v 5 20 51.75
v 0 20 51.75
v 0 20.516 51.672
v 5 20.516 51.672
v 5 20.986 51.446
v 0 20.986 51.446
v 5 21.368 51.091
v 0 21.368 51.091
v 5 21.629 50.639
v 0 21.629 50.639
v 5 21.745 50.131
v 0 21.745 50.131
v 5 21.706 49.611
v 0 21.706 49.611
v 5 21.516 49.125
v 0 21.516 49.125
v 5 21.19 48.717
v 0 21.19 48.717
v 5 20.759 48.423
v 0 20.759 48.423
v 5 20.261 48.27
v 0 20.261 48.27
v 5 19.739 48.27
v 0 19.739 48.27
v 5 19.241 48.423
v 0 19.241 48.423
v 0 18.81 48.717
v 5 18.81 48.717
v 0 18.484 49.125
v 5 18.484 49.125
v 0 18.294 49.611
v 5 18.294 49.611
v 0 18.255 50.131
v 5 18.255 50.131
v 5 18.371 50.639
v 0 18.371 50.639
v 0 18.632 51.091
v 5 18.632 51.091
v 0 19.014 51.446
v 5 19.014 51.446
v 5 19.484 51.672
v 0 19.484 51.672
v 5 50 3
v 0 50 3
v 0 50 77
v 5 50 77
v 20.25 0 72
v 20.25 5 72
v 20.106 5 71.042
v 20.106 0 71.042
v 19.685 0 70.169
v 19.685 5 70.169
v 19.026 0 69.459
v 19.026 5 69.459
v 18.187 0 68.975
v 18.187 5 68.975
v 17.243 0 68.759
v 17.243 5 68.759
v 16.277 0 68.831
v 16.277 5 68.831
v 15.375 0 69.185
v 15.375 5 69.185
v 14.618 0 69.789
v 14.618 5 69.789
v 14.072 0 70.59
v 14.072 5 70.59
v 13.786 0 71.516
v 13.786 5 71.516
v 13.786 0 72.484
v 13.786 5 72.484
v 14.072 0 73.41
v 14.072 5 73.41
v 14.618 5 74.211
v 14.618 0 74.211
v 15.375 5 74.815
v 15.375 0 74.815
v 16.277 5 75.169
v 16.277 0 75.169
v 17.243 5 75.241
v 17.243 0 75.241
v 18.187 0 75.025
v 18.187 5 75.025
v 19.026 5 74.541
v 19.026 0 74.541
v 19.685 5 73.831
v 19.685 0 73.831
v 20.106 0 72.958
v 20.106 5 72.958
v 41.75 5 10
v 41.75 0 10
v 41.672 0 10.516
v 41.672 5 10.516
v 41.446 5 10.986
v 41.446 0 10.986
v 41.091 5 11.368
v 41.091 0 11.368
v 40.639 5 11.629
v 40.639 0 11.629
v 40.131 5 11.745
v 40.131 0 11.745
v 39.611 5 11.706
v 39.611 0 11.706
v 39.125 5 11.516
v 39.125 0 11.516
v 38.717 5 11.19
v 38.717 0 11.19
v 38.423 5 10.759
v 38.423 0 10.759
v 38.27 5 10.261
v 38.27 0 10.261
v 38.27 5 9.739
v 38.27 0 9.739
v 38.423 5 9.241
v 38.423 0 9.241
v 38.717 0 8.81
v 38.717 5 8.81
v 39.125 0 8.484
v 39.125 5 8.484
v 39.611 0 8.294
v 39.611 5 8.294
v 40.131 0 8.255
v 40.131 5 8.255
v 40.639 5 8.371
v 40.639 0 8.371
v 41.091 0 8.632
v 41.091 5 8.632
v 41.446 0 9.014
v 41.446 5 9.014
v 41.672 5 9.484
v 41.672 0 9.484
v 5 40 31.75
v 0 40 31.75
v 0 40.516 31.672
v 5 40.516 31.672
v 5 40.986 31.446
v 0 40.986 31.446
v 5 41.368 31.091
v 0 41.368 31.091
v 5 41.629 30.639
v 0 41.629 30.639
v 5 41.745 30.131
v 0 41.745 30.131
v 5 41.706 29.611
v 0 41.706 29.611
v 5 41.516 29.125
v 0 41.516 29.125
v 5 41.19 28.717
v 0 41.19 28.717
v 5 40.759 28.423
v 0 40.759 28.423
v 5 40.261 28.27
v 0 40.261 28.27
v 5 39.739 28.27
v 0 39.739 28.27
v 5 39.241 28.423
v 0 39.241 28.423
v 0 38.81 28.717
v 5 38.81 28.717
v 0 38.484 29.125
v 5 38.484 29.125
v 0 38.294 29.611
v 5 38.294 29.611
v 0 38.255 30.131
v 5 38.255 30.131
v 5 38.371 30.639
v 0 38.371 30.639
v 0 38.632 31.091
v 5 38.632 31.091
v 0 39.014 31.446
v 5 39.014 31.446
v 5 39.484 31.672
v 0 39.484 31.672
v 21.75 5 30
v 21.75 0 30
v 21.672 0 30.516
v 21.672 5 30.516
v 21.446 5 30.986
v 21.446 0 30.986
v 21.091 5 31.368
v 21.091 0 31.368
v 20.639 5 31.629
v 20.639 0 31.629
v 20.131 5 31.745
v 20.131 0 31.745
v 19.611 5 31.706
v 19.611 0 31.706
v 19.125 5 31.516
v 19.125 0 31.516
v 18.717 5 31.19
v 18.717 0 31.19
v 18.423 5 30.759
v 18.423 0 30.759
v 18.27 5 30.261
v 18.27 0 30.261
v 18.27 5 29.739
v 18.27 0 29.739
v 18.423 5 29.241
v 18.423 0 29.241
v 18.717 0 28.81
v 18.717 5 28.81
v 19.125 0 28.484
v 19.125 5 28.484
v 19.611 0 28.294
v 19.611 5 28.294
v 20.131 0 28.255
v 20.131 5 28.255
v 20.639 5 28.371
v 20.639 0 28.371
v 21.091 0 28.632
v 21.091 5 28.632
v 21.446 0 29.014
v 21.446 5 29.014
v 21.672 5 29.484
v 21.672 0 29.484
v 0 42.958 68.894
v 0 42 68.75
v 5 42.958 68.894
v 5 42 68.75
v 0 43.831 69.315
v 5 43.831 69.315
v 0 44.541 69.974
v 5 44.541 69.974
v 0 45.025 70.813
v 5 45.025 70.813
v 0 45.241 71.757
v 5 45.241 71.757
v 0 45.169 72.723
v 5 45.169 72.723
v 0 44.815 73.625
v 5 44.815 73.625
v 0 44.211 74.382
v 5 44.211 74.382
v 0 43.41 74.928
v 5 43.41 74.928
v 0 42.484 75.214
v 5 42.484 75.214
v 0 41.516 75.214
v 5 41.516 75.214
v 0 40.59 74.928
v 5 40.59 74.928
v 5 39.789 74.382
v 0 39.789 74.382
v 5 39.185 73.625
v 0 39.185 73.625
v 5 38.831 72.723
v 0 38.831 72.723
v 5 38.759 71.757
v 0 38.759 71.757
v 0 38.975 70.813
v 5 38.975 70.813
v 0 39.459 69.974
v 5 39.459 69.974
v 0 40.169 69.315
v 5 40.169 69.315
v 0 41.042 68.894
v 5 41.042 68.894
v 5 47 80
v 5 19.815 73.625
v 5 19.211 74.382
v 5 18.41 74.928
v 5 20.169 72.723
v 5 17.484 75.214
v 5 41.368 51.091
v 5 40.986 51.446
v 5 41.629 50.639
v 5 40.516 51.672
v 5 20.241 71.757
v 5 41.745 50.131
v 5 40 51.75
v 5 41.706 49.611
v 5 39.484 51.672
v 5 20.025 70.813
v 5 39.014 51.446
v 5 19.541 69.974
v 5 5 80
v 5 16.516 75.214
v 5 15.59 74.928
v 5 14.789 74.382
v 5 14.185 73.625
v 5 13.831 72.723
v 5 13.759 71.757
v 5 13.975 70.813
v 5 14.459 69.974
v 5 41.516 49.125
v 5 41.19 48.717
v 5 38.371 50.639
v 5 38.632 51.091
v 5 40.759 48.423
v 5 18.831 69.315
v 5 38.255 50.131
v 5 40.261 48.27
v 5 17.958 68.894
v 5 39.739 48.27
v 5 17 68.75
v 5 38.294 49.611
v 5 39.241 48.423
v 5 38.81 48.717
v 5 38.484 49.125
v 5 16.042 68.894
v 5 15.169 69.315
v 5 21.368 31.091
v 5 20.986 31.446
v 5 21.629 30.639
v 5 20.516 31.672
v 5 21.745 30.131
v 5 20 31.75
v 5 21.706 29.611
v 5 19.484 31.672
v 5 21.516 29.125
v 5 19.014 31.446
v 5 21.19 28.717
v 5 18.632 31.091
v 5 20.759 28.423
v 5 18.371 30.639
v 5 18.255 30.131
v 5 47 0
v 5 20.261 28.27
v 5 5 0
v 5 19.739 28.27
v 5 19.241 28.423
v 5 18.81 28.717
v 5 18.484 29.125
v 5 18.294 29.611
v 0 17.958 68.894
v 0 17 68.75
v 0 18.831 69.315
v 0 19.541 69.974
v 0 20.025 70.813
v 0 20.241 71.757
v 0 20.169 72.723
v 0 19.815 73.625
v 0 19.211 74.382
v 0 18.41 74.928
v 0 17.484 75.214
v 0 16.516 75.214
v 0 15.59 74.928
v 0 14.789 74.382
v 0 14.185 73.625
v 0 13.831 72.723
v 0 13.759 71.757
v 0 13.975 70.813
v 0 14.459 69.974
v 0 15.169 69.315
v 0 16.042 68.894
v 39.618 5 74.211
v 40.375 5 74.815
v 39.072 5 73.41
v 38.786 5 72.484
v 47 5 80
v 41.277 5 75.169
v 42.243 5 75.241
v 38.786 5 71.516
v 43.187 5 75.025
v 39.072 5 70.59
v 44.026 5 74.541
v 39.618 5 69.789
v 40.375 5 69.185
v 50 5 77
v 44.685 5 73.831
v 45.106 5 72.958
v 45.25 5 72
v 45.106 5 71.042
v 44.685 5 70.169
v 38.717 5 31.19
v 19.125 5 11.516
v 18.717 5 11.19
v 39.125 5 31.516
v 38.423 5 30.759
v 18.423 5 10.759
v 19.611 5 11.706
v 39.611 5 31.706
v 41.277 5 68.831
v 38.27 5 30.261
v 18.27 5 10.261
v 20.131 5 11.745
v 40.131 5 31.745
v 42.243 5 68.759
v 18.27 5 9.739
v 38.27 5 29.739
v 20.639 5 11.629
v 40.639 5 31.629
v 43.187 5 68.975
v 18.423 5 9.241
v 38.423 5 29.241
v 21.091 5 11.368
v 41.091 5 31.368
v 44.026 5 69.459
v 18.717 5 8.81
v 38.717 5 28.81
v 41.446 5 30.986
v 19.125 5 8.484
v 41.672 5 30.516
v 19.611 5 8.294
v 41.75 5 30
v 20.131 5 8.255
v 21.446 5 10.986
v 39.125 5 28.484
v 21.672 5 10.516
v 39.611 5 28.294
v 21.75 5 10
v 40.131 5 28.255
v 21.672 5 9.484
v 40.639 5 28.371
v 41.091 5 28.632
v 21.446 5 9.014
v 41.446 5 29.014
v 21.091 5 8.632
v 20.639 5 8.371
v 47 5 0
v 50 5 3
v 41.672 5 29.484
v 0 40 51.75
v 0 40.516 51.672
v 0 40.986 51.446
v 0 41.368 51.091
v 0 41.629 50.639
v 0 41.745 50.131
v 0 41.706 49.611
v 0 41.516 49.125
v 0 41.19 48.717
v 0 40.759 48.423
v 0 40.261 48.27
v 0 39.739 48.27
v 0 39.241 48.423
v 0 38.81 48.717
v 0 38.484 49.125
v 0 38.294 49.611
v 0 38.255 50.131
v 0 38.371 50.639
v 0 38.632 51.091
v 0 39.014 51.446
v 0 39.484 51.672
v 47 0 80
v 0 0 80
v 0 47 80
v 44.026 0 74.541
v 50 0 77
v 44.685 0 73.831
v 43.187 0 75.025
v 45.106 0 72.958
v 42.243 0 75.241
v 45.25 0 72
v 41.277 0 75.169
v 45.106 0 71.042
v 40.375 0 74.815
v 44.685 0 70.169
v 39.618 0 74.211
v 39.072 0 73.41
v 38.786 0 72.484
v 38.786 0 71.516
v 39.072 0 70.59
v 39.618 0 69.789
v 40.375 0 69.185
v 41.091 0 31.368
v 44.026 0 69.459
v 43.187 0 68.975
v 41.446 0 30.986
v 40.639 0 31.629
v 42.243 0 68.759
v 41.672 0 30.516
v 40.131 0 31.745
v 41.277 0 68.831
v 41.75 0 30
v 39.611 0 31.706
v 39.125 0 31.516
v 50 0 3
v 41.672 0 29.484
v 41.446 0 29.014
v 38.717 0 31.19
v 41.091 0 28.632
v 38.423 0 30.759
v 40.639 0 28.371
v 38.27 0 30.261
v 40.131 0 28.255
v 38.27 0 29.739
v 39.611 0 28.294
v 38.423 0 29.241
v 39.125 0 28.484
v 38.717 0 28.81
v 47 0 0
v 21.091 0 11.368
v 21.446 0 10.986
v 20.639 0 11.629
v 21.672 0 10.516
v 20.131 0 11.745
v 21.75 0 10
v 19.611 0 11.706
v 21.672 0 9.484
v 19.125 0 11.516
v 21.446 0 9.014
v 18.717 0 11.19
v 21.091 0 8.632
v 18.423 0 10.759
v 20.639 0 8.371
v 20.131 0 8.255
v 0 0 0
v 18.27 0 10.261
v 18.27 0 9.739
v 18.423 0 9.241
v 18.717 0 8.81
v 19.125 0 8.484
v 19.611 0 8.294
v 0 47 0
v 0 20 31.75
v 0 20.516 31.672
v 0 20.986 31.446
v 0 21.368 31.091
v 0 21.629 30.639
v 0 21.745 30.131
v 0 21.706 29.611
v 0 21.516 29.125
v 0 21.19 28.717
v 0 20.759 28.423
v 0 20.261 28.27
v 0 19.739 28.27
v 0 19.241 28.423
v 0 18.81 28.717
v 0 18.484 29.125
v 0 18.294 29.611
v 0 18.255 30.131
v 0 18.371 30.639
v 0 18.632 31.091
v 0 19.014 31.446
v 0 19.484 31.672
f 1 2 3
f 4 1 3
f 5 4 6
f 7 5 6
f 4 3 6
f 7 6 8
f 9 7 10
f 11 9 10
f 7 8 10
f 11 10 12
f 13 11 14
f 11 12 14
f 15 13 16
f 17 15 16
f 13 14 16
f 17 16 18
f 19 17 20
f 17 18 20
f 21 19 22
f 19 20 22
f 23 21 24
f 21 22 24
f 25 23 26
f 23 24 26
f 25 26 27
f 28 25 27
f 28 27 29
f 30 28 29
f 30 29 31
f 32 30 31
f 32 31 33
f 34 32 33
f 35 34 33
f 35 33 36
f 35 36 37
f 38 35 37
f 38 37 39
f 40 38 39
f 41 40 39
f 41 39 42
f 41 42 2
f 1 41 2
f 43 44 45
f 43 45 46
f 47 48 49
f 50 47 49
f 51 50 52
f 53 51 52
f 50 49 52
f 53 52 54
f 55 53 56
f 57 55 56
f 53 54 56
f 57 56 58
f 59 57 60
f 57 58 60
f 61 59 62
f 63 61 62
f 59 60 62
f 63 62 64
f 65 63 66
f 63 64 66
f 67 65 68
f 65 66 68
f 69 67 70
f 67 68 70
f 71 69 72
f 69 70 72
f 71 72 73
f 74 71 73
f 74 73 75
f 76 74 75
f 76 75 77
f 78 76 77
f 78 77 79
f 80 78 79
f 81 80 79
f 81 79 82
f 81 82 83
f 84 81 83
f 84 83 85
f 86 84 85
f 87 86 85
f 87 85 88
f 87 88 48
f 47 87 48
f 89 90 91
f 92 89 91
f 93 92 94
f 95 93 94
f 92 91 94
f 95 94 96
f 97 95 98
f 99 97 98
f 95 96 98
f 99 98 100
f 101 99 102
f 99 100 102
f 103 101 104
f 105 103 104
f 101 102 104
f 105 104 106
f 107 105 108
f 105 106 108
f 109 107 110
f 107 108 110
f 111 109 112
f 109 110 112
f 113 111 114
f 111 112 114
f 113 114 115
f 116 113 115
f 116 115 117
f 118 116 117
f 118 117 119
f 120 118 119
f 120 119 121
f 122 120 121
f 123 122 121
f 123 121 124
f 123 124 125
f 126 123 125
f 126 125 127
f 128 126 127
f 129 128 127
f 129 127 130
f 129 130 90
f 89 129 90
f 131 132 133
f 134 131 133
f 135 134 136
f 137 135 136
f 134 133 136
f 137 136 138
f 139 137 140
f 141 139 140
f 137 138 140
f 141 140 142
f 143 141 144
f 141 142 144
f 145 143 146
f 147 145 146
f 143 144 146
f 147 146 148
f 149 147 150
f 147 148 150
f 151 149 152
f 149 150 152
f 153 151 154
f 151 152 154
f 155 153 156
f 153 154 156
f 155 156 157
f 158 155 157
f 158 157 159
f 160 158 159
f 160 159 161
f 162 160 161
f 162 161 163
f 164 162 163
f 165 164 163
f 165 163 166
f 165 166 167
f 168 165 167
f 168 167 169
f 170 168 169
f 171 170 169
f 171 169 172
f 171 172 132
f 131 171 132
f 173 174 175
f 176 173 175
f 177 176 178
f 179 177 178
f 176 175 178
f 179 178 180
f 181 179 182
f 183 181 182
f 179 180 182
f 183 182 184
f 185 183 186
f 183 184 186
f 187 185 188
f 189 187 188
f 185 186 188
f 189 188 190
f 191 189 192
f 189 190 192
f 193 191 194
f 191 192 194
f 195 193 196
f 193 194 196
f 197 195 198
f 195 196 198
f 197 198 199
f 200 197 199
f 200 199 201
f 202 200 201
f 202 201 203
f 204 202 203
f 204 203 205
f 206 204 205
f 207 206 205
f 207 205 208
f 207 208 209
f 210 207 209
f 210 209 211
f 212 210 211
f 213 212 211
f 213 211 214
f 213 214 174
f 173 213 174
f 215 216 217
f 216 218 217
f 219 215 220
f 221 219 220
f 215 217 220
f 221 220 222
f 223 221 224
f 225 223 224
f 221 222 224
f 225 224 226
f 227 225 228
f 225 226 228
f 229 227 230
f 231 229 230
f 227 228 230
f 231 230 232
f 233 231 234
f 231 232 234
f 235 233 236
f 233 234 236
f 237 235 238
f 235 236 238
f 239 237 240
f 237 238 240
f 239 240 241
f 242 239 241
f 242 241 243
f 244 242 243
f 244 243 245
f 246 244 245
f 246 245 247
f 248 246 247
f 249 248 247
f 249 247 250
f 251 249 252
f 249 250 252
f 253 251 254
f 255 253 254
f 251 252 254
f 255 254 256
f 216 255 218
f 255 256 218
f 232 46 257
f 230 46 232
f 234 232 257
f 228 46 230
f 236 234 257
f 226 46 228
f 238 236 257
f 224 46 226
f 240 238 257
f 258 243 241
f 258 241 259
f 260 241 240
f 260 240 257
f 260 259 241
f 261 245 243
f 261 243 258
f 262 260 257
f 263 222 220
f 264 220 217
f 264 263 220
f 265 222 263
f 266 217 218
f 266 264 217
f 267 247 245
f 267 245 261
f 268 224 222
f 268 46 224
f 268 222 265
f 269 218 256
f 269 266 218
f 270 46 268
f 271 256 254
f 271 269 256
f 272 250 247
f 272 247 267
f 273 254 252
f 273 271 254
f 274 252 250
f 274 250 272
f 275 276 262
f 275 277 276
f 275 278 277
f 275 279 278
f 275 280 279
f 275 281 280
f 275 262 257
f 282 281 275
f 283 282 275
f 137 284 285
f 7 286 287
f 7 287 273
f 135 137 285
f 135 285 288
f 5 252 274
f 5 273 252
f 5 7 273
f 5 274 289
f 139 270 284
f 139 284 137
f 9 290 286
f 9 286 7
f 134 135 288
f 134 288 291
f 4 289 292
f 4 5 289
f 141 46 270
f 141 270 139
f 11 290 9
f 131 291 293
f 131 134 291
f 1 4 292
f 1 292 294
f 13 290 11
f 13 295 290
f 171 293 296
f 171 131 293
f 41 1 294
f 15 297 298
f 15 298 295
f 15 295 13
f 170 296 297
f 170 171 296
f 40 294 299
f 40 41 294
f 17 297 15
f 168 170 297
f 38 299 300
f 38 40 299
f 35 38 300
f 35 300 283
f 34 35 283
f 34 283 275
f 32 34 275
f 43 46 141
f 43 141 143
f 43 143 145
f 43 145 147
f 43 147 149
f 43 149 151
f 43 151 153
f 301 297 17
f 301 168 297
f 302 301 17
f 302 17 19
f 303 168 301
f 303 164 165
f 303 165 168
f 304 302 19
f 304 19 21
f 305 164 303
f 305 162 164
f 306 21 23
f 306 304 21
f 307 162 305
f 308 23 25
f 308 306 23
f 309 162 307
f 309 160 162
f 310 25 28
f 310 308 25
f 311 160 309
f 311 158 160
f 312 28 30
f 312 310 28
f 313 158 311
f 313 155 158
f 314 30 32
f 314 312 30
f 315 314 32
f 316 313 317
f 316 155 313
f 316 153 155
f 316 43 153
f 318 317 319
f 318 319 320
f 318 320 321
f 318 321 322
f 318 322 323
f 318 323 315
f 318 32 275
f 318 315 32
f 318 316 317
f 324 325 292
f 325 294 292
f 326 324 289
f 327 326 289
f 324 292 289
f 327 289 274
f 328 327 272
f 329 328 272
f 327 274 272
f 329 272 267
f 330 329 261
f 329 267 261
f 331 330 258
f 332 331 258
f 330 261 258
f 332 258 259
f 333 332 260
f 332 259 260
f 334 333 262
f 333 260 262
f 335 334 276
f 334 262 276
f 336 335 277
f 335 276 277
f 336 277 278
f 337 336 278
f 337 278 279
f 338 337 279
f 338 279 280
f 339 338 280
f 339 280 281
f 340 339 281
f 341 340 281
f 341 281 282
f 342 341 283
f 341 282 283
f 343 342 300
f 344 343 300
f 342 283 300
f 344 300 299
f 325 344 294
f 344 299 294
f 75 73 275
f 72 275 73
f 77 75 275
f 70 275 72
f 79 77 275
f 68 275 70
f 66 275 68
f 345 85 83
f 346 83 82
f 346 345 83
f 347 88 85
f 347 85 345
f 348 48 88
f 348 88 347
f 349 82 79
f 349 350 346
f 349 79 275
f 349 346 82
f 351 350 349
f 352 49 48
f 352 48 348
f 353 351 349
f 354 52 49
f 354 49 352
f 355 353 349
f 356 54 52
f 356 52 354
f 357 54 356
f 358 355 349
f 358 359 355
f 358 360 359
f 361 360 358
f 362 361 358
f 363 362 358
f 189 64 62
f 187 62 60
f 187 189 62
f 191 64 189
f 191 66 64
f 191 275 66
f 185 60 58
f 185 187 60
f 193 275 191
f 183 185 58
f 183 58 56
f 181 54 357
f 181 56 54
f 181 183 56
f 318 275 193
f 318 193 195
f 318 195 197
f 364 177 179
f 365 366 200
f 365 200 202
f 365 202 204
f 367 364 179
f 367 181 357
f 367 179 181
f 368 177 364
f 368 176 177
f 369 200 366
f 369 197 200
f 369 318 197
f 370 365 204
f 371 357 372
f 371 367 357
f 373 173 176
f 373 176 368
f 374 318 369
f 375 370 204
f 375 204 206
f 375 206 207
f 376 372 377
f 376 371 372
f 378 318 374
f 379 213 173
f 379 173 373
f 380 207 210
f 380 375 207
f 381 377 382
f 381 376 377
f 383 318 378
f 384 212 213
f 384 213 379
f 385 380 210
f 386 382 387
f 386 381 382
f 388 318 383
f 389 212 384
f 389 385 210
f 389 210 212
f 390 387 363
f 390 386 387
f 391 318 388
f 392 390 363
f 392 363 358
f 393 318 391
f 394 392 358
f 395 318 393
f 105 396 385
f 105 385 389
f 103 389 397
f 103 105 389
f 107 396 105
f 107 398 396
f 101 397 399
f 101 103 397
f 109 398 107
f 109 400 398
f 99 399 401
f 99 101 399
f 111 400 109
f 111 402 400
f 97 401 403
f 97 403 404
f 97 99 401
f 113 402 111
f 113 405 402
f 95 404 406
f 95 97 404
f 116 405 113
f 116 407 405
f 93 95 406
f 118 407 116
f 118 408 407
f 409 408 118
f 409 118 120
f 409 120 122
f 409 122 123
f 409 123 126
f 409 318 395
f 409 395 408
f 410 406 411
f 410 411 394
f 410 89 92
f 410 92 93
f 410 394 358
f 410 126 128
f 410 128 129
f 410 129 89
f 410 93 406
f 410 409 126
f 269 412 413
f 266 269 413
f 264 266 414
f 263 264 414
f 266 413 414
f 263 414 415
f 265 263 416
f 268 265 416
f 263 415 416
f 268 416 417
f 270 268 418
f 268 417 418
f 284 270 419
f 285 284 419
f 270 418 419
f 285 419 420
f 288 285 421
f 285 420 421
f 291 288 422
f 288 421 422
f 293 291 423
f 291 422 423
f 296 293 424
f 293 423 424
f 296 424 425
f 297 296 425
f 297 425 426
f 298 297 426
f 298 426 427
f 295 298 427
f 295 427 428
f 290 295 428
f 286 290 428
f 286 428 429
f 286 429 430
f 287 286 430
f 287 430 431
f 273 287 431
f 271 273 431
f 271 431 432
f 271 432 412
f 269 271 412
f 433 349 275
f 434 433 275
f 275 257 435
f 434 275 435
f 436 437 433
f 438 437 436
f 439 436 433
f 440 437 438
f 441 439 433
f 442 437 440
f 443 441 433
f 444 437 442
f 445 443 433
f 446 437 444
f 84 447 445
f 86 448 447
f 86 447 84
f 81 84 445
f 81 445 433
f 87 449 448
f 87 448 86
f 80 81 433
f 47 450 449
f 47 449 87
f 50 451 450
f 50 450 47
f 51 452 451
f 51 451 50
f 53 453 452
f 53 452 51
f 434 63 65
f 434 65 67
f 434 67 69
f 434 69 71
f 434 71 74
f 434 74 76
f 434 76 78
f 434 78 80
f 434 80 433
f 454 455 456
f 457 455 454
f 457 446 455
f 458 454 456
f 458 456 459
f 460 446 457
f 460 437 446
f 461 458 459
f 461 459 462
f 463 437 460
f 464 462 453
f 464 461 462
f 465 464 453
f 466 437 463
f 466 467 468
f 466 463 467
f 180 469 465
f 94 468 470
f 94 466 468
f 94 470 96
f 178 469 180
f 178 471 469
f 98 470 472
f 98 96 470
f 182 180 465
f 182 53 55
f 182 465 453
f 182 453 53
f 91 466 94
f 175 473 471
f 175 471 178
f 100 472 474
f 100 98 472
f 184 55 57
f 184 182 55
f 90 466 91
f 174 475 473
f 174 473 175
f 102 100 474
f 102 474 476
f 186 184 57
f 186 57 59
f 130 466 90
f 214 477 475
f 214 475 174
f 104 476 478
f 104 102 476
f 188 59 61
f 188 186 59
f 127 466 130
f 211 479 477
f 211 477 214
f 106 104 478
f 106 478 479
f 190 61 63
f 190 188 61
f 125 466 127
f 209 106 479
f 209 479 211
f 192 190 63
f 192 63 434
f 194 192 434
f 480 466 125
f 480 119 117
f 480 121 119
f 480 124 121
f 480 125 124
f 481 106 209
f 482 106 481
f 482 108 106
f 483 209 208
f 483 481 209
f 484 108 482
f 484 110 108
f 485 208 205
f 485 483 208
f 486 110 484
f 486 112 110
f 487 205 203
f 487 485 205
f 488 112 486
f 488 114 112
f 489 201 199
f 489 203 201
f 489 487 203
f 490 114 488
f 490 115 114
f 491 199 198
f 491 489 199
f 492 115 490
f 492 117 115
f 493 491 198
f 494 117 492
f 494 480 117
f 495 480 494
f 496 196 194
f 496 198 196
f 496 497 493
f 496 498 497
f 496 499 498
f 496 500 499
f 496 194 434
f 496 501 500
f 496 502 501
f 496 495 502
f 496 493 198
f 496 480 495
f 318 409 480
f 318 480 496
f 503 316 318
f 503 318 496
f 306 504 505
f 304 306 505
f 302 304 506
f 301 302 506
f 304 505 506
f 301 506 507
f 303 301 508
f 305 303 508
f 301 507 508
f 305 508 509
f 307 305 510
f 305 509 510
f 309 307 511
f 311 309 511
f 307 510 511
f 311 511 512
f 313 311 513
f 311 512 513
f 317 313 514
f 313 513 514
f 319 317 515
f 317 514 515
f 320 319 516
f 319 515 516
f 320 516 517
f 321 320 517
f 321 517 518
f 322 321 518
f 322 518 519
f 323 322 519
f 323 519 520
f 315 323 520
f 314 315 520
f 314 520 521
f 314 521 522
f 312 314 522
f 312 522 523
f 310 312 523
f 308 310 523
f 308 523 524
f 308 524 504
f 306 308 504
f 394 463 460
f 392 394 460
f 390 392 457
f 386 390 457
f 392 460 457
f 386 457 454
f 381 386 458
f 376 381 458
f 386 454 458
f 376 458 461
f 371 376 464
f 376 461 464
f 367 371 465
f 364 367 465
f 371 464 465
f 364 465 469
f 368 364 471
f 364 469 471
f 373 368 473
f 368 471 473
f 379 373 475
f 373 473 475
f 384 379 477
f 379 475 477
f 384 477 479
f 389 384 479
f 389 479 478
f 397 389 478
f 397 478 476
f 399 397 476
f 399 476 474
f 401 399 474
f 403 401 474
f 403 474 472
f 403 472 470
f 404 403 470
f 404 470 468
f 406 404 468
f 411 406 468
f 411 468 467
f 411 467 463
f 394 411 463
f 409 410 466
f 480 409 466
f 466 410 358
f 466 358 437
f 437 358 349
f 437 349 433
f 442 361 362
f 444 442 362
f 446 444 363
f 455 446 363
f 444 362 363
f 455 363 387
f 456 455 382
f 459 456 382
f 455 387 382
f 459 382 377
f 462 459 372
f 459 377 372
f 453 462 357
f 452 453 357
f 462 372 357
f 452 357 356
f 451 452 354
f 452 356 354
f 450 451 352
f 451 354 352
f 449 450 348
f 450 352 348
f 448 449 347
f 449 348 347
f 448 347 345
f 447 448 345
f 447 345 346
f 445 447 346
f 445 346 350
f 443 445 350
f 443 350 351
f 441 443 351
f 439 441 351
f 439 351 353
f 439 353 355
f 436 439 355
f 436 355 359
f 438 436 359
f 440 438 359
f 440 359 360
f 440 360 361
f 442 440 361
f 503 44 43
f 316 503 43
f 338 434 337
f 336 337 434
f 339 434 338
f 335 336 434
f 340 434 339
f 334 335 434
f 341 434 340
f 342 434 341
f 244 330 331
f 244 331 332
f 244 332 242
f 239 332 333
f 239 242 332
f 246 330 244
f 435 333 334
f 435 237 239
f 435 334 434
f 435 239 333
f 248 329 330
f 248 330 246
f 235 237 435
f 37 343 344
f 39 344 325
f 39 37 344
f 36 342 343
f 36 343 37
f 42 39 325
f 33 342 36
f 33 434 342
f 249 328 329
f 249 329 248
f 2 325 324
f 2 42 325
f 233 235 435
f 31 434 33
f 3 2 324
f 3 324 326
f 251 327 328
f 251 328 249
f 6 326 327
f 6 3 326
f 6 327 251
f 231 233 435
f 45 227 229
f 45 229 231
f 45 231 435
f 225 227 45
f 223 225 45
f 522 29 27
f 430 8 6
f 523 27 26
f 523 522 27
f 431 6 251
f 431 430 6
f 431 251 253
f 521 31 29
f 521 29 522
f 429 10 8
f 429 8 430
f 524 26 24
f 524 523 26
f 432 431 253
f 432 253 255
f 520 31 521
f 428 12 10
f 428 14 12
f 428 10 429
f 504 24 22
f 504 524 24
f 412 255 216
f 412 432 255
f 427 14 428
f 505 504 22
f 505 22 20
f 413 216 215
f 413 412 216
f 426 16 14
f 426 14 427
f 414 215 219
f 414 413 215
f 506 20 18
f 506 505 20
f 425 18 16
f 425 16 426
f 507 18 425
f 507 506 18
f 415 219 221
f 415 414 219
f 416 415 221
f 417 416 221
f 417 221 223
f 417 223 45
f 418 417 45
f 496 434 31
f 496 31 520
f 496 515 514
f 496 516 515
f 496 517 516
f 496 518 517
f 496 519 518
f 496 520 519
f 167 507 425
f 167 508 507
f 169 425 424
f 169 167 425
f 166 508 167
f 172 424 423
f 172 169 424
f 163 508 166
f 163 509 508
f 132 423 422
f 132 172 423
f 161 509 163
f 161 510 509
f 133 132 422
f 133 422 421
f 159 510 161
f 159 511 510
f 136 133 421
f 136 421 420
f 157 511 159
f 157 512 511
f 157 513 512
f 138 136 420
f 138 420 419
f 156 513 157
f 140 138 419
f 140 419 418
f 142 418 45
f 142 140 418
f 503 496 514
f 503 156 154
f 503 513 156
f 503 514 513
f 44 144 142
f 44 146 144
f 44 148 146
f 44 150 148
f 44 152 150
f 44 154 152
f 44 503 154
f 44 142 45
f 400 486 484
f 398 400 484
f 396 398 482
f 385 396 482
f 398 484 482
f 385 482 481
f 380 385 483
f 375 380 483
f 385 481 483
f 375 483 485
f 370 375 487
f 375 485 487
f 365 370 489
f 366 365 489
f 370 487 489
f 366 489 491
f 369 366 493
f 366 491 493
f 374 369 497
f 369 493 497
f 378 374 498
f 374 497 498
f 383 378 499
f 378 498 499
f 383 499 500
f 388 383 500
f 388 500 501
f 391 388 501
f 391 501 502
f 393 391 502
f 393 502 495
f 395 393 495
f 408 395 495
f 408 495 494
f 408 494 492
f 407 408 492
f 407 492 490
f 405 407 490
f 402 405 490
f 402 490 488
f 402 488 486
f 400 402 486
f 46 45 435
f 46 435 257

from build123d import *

# Parameters (mm, degrees)
ESTRUSIONE_ESTRUSIONE1_DEPTH = 80
FORO_6_5_6_5_1_D             = 6.5
FORO_6_5_6_5_2_D             = 6.5
FORO_6_5_6_5_2_DEPTH         = 5
FORO_6_5_6_5_2_TIP           = 1.952797012
TAGLIO_ESTRUSIONE1_REACH     = 108.771
SCHIZZO8_R                   = 1.75
TAGLIO_ESTRUSIONE2_REACH     = 108.771
SCHIZZO9_R                   = 1.75
SMUSSO1_SIZE                 = 3


with BuildPart() as part:
    # Schizzo1 → Estrusione-Estrusione1 (new body)
    with BuildSketch(Plane.XY):
        Polygon((0, 0), (0, 50), (5, 50), (5, 5), (50, 5), (50, 0), align=None)
    extrude(amount=ESTRUSIONE_ESTRUSIONE1_DEPTH)

    # Foro Ø6.5 (6.5)-1 (through all)
    with Locations(Plane(origin=(0, 0, 0), x_dir=(-1, 0, 0), z_dir=(0, -1, 0))):
        with Locations((-17, -72), (-42, -72)):
            Hole(FORO_6_5_6_5_1_D / 2)

    # Foro Ø6.5 (6.5)-2
    with Locations(Plane.ZY):
        with Locations((72, 42), (72, 17)):
            Hole(FORO_6_5_6_5_2_D / 2, depth=FORO_6_5_6_5_2_DEPTH)
            with Locations((0, 0, -(FORO_6_5_6_5_2_DEPTH + FORO_6_5_6_5_2_TIP / 2))):  # 118° drill point
                Cone(0, FORO_6_5_6_5_2_D / 2, FORO_6_5_6_5_2_TIP, mode=Mode.SUBTRACT)

    # Schizzo8 → Taglio-Estrusione1 (cut, up to next)
    with BuildSketch(Plane.XZ, mode=Mode.PRIVATE) as taglio_estrusione1_sk1:
        with Locations((20, 10)):
            Circle(SCHIZZO8_R)
    taglio_estrusione1_tool1 = extrude(taglio_estrusione1_sk1.sketch, amount=-TAGLIO_ESTRUSIONE1_REACH, mode=Mode.PRIVATE) & part.part
    # Schizzo8 → Taglio-Estrusione1 (cut, up to next)
    with BuildSketch(Plane.XZ, mode=Mode.PRIVATE) as taglio_estrusione1_sk2:
        with Locations((20, 30)):
            Circle(SCHIZZO8_R)
    taglio_estrusione1_tool2 = extrude(taglio_estrusione1_sk2.sketch, amount=-TAGLIO_ESTRUSIONE1_REACH, mode=Mode.PRIVATE) & part.part
    # Schizzo8 → Taglio-Estrusione1 (cut, up to next)
    with BuildSketch(Plane.XZ, mode=Mode.PRIVATE) as taglio_estrusione1_sk3:
        with Locations((40, 30)):
            Circle(SCHIZZO8_R)
    taglio_estrusione1_tool3 = extrude(taglio_estrusione1_sk3.sketch, amount=-TAGLIO_ESTRUSIONE1_REACH, mode=Mode.PRIVATE) & part.part
    # Schizzo8 → Taglio-Estrusione1 (cut, up to next)
    with BuildSketch(Plane.XZ, mode=Mode.PRIVATE) as taglio_estrusione1_sk4:
        with Locations((40, 10)):
            Circle(SCHIZZO8_R)
    taglio_estrusione1_tool4 = extrude(taglio_estrusione1_sk4.sketch, amount=-TAGLIO_ESTRUSIONE1_REACH, mode=Mode.PRIVATE) & part.part
    add(taglio_estrusione1_tool1.solids().sort_by_distance((20, 0, 10))[0], mode=Mode.SUBTRACT)
    add(taglio_estrusione1_tool2.solids().sort_by_distance((20, 0, 30))[0], mode=Mode.SUBTRACT)
    add(taglio_estrusione1_tool3.solids().sort_by_distance((40, 0, 30))[0], mode=Mode.SUBTRACT)
    add(taglio_estrusione1_tool4.solids().sort_by_distance((40, 0, 10))[0], mode=Mode.SUBTRACT)

    # Schizzo9 → Taglio-Estrusione2 (cut, up to next)
    with BuildSketch(Plane.ZY, mode=Mode.PRIVATE) as taglio_estrusione2_sk1:
        with Locations((30, 40)):
            Circle(SCHIZZO9_R)
    taglio_estrusione2_tool1 = extrude(taglio_estrusione2_sk1.sketch, amount=-TAGLIO_ESTRUSIONE2_REACH, mode=Mode.PRIVATE) & part.part
    # Schizzo9 → Taglio-Estrusione2 (cut, up to next)
    with BuildSketch(Plane.ZY, mode=Mode.PRIVATE) as taglio_estrusione2_sk2:
        with Locations((50, 40)):
            Circle(SCHIZZO9_R)
    taglio_estrusione2_tool2 = extrude(taglio_estrusione2_sk2.sketch, amount=-TAGLIO_ESTRUSIONE2_REACH, mode=Mode.PRIVATE) & part.part
    # Schizzo9 → Taglio-Estrusione2 (cut, up to next)
    with BuildSketch(Plane.ZY, mode=Mode.PRIVATE) as taglio_estrusione2_sk3:
        with Locations((50, 20)):
            Circle(SCHIZZO9_R)
    taglio_estrusione2_tool3 = extrude(taglio_estrusione2_sk3.sketch, amount=-TAGLIO_ESTRUSIONE2_REACH, mode=Mode.PRIVATE) & part.part
    # Schizzo9 → Taglio-Estrusione2 (cut, up to next)
    with BuildSketch(Plane.ZY, mode=Mode.PRIVATE) as taglio_estrusione2_sk4:
        with Locations((30, 20)):
            Circle(SCHIZZO9_R)
    taglio_estrusione2_tool4 = extrude(taglio_estrusione2_sk4.sketch, amount=-TAGLIO_ESTRUSIONE2_REACH, mode=Mode.PRIVATE) & part.part
    add(taglio_estrusione2_tool1.solids().sort_by_distance((0, 40, 30))[0], mode=Mode.SUBTRACT)
    add(taglio_estrusione2_tool2.solids().sort_by_distance((0, 40, 50))[0], mode=Mode.SUBTRACT)
    add(taglio_estrusione2_tool3.solids().sort_by_distance((0, 20, 50))[0], mode=Mode.SUBTRACT)
    add(taglio_estrusione2_tool4.solids().sort_by_distance((0, 20, 30))[0], mode=Mode.SUBTRACT)

    # Smusso1
    smusso1_edges = [part.edges().sort_by_distance(p)[0] for p in [
        (2.5, 50, 80),
        (2.5, 50, 0),
        (50, 2.5, 80),
        (50, 2.5, 0),
    ]]
    chamfer(smusso1_edges, length=SMUSSO1_SIZE)


solid = part.part
